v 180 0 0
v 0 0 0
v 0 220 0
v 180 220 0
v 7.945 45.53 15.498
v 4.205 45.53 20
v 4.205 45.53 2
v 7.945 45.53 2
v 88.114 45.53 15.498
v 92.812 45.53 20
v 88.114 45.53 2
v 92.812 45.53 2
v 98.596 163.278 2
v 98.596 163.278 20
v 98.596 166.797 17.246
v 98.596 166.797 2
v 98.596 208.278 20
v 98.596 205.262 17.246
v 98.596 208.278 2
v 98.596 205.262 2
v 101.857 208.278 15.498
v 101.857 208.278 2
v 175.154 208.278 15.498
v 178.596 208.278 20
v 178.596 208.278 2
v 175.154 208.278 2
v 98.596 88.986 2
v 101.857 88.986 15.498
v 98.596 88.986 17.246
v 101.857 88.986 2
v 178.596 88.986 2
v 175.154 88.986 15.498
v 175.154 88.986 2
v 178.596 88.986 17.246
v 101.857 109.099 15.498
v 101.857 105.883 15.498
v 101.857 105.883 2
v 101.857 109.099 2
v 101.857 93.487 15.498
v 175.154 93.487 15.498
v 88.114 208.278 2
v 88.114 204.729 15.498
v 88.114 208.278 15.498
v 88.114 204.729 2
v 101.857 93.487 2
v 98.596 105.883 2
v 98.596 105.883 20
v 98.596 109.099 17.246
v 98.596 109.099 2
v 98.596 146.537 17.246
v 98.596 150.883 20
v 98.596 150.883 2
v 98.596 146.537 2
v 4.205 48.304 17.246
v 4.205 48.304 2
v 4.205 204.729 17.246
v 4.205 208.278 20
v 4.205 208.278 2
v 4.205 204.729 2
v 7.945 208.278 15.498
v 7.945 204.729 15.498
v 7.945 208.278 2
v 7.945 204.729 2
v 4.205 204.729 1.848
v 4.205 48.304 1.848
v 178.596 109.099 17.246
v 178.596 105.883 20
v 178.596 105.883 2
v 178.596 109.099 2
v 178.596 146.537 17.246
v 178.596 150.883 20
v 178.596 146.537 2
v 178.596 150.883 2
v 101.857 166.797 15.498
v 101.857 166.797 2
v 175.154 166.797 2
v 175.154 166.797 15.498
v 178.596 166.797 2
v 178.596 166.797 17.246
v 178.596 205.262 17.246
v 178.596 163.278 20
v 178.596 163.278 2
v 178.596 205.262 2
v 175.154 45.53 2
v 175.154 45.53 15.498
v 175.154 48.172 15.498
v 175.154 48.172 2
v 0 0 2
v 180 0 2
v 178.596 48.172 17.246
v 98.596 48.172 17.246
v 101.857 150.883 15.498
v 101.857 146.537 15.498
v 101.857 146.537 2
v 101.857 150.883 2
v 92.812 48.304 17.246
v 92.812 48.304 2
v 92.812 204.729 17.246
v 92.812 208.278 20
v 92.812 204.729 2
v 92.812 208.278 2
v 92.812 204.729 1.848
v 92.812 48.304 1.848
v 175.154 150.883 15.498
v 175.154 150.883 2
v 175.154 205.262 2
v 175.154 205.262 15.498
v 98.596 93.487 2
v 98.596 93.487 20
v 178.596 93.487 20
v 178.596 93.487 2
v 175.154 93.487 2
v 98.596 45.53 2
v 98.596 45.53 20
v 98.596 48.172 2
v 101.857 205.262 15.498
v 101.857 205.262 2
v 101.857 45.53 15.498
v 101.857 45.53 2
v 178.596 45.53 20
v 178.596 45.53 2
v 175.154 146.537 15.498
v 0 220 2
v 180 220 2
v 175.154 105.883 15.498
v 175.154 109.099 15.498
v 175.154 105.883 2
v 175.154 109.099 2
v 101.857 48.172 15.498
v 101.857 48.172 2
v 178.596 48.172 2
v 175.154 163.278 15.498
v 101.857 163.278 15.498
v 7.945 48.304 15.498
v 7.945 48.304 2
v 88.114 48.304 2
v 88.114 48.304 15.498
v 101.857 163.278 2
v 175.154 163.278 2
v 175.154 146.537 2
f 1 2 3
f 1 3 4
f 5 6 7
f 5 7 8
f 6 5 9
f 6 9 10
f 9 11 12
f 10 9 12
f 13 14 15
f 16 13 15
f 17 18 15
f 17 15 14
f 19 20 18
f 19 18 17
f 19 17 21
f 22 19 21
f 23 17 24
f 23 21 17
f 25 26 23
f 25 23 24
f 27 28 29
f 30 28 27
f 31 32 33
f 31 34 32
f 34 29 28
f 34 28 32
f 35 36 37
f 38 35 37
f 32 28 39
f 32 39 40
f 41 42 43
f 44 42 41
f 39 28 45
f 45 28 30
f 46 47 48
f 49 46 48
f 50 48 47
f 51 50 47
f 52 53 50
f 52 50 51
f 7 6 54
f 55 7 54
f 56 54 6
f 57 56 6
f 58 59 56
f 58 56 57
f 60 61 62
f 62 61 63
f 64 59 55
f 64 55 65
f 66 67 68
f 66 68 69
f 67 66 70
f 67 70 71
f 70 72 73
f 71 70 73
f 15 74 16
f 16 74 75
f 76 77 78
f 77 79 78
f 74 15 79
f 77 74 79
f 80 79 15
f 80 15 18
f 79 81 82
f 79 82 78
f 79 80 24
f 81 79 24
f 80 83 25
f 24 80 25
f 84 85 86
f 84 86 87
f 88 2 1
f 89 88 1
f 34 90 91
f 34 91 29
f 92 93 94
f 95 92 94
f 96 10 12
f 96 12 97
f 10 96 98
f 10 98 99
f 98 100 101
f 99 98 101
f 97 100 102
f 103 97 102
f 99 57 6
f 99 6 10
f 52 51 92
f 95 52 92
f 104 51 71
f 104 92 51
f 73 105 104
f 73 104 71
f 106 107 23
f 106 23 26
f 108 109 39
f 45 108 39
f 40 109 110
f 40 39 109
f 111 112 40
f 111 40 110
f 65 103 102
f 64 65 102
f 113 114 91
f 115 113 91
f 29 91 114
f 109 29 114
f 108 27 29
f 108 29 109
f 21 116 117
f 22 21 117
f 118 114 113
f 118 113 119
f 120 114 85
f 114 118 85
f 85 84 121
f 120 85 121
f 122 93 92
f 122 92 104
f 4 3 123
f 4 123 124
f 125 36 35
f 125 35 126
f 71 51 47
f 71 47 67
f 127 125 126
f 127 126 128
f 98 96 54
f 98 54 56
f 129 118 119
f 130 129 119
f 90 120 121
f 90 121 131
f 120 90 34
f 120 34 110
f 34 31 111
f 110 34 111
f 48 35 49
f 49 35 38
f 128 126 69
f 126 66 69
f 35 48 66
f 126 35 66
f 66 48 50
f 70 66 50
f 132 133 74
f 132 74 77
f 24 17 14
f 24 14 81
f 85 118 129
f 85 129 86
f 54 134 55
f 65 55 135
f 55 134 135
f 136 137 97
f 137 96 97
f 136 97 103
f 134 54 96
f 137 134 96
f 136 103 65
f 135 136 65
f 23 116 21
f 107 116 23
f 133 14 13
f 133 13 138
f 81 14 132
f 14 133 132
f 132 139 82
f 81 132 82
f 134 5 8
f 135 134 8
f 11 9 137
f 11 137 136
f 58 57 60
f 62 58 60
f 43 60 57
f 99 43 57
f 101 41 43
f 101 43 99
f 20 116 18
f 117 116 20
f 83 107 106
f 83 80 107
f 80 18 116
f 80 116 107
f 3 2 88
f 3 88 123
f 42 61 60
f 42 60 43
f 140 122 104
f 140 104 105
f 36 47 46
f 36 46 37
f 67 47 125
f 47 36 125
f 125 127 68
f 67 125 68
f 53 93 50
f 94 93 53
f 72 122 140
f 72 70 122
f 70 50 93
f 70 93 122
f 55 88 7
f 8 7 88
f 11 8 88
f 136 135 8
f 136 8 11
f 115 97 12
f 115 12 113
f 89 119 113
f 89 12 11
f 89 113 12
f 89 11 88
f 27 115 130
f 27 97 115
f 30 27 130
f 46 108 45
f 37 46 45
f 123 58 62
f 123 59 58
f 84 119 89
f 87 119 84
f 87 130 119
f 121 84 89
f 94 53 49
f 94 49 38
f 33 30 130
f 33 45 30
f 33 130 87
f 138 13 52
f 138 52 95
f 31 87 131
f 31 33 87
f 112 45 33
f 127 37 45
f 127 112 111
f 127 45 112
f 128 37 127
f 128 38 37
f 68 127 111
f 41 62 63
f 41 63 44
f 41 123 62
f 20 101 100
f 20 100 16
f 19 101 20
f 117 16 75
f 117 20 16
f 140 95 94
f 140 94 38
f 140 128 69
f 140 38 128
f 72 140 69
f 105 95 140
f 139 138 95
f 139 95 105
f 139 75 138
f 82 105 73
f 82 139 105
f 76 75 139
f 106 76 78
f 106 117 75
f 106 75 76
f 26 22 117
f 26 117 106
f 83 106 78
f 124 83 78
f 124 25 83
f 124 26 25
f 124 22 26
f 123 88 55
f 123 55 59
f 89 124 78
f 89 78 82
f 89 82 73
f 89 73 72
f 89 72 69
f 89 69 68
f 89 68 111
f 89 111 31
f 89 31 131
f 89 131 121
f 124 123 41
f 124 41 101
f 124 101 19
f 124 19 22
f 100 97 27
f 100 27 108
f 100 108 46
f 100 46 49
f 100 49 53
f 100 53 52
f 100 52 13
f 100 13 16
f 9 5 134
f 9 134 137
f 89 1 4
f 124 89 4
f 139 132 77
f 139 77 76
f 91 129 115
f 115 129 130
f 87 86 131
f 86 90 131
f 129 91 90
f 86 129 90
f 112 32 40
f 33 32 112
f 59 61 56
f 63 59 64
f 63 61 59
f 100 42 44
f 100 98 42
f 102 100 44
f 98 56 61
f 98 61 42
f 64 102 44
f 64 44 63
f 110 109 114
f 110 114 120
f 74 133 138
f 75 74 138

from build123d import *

# Parameters (mm, degrees)
SKETCH1_W               = 180
SKETCH1_H               = 220
BASE_DEPTH              = 2
SKETCH2_W               = 88.607017387
SKETCH2_H               = 162.747582956
SKETCH2_W_2             = 80
SKETCH2_H_2             = 45
SKETCH2_H_3             = 47.956874403
BOARDS_DEPTH            = 20
CUT_EXTRUDE1_DEPTH      = 285.956136976
CUT_EXTRUDE1_DEPTH_BACK = 285.956136976
SKETCH3_W               = 80.16842423
SKETCH3_H               = 13.497664936
SKETCH3_W_2             = 73.29684501
SKETCH4_W               = 15.397369521
SKETCH4_H               = 156.425076719
CUT_EXTRUDE2_DEPTH      = 88.607017387
SKETCH5_W               = 15.24584824
SKETCH5_H               = 38.4651821
SKETCH5_H_2             = 37.437486396
SKETCH5_H_3             = 40.814200855
CUT_EXTRUDE3_DEPTH      = 80


with BuildPart() as part:
    # Sketch1 → Base (new body)
    with BuildSketch(Plane.XY):
        with Locations((90, 110)):
            Rectangle(SKETCH1_W, SKETCH1_H)
    extrude(amount=BASE_DEPTH)

    # Sketch2 → Boards (add)
    with BuildSketch(Plane.XY):
        with Locations((48.5089102, 126.904245713)):
            Rectangle(SKETCH2_W, SKETCH2_H)
        with Locations((138.596199401, 185.778037191)):
            Rectangle(SKETCH2_W_2, SKETCH2_H_2)
        with Locations((138.596199401, 128.382682915)):
            Rectangle(SKETCH2_W_2, SKETCH2_H_2)
        with Locations((138.596199401, 69.508891437)):
            Rectangle(SKETCH2_W_2, SKETCH2_H_3)
    extrude(amount=BOARDS_DEPTH)

    # Sketch3 → Cut-Extrude1 (cut, two sides: drawn at the far end of the back side and taken through both)
    with BuildSketch(Plane(origin=(0, 0, 0), x_dir=(1, 0, 0), z_dir=(0, 1, 0)).offset(-CUT_EXTRUDE1_DEPTH_BACK)):
        with Locations((48.029472021, -8.748832468)):
            Rectangle(SKETCH3_W, SKETCH3_H)
        with Locations((138.50526508, -8.748832468)):
            Rectangle(SKETCH3_W_2, SKETCH3_H)
    extrude(amount=CUT_EXTRUDE1_DEPTH + CUT_EXTRUDE1_DEPTH_BACK, mode=Mode.SUBTRACT)

    # Sketch4 → Cut-Extrude2 (cut)
    with BuildSketch(Plane(origin=(92.812418893, 0, 0), x_dir=(0, 0, -1), z_dir=(1, 0, 0))):
        with Locations((-9.547163479, 126.516271725)):
            Rectangle(SKETCH4_W, SKETCH4_H)
    extrude(amount=-CUT_EXTRUDE2_DEPTH, mode=Mode.SUBTRACT)

    # Sketch5 → Cut-Extrude3 (cut)
    with BuildSketch(Plane(origin=(178.596199401, 0, 0), x_dir=(0, 0, -1), z_dir=(1, 0, 0))):
        with Locations((-9.62292412, 186.029564078)):
            Rectangle(SKETCH5_W, SKETCH5_H)
        with Locations((-9.62292412, 127.817943074)):
            Rectangle(SKETCH5_W, SKETCH5_H_2)
        with Locations((-9.62292412, 68.578626366)):
            Rectangle(SKETCH5_W, SKETCH5_H_3)
    extrude(amount=-CUT_EXTRUDE3_DEPTH, mode=Mode.SUBTRACT)


solid = part.part
